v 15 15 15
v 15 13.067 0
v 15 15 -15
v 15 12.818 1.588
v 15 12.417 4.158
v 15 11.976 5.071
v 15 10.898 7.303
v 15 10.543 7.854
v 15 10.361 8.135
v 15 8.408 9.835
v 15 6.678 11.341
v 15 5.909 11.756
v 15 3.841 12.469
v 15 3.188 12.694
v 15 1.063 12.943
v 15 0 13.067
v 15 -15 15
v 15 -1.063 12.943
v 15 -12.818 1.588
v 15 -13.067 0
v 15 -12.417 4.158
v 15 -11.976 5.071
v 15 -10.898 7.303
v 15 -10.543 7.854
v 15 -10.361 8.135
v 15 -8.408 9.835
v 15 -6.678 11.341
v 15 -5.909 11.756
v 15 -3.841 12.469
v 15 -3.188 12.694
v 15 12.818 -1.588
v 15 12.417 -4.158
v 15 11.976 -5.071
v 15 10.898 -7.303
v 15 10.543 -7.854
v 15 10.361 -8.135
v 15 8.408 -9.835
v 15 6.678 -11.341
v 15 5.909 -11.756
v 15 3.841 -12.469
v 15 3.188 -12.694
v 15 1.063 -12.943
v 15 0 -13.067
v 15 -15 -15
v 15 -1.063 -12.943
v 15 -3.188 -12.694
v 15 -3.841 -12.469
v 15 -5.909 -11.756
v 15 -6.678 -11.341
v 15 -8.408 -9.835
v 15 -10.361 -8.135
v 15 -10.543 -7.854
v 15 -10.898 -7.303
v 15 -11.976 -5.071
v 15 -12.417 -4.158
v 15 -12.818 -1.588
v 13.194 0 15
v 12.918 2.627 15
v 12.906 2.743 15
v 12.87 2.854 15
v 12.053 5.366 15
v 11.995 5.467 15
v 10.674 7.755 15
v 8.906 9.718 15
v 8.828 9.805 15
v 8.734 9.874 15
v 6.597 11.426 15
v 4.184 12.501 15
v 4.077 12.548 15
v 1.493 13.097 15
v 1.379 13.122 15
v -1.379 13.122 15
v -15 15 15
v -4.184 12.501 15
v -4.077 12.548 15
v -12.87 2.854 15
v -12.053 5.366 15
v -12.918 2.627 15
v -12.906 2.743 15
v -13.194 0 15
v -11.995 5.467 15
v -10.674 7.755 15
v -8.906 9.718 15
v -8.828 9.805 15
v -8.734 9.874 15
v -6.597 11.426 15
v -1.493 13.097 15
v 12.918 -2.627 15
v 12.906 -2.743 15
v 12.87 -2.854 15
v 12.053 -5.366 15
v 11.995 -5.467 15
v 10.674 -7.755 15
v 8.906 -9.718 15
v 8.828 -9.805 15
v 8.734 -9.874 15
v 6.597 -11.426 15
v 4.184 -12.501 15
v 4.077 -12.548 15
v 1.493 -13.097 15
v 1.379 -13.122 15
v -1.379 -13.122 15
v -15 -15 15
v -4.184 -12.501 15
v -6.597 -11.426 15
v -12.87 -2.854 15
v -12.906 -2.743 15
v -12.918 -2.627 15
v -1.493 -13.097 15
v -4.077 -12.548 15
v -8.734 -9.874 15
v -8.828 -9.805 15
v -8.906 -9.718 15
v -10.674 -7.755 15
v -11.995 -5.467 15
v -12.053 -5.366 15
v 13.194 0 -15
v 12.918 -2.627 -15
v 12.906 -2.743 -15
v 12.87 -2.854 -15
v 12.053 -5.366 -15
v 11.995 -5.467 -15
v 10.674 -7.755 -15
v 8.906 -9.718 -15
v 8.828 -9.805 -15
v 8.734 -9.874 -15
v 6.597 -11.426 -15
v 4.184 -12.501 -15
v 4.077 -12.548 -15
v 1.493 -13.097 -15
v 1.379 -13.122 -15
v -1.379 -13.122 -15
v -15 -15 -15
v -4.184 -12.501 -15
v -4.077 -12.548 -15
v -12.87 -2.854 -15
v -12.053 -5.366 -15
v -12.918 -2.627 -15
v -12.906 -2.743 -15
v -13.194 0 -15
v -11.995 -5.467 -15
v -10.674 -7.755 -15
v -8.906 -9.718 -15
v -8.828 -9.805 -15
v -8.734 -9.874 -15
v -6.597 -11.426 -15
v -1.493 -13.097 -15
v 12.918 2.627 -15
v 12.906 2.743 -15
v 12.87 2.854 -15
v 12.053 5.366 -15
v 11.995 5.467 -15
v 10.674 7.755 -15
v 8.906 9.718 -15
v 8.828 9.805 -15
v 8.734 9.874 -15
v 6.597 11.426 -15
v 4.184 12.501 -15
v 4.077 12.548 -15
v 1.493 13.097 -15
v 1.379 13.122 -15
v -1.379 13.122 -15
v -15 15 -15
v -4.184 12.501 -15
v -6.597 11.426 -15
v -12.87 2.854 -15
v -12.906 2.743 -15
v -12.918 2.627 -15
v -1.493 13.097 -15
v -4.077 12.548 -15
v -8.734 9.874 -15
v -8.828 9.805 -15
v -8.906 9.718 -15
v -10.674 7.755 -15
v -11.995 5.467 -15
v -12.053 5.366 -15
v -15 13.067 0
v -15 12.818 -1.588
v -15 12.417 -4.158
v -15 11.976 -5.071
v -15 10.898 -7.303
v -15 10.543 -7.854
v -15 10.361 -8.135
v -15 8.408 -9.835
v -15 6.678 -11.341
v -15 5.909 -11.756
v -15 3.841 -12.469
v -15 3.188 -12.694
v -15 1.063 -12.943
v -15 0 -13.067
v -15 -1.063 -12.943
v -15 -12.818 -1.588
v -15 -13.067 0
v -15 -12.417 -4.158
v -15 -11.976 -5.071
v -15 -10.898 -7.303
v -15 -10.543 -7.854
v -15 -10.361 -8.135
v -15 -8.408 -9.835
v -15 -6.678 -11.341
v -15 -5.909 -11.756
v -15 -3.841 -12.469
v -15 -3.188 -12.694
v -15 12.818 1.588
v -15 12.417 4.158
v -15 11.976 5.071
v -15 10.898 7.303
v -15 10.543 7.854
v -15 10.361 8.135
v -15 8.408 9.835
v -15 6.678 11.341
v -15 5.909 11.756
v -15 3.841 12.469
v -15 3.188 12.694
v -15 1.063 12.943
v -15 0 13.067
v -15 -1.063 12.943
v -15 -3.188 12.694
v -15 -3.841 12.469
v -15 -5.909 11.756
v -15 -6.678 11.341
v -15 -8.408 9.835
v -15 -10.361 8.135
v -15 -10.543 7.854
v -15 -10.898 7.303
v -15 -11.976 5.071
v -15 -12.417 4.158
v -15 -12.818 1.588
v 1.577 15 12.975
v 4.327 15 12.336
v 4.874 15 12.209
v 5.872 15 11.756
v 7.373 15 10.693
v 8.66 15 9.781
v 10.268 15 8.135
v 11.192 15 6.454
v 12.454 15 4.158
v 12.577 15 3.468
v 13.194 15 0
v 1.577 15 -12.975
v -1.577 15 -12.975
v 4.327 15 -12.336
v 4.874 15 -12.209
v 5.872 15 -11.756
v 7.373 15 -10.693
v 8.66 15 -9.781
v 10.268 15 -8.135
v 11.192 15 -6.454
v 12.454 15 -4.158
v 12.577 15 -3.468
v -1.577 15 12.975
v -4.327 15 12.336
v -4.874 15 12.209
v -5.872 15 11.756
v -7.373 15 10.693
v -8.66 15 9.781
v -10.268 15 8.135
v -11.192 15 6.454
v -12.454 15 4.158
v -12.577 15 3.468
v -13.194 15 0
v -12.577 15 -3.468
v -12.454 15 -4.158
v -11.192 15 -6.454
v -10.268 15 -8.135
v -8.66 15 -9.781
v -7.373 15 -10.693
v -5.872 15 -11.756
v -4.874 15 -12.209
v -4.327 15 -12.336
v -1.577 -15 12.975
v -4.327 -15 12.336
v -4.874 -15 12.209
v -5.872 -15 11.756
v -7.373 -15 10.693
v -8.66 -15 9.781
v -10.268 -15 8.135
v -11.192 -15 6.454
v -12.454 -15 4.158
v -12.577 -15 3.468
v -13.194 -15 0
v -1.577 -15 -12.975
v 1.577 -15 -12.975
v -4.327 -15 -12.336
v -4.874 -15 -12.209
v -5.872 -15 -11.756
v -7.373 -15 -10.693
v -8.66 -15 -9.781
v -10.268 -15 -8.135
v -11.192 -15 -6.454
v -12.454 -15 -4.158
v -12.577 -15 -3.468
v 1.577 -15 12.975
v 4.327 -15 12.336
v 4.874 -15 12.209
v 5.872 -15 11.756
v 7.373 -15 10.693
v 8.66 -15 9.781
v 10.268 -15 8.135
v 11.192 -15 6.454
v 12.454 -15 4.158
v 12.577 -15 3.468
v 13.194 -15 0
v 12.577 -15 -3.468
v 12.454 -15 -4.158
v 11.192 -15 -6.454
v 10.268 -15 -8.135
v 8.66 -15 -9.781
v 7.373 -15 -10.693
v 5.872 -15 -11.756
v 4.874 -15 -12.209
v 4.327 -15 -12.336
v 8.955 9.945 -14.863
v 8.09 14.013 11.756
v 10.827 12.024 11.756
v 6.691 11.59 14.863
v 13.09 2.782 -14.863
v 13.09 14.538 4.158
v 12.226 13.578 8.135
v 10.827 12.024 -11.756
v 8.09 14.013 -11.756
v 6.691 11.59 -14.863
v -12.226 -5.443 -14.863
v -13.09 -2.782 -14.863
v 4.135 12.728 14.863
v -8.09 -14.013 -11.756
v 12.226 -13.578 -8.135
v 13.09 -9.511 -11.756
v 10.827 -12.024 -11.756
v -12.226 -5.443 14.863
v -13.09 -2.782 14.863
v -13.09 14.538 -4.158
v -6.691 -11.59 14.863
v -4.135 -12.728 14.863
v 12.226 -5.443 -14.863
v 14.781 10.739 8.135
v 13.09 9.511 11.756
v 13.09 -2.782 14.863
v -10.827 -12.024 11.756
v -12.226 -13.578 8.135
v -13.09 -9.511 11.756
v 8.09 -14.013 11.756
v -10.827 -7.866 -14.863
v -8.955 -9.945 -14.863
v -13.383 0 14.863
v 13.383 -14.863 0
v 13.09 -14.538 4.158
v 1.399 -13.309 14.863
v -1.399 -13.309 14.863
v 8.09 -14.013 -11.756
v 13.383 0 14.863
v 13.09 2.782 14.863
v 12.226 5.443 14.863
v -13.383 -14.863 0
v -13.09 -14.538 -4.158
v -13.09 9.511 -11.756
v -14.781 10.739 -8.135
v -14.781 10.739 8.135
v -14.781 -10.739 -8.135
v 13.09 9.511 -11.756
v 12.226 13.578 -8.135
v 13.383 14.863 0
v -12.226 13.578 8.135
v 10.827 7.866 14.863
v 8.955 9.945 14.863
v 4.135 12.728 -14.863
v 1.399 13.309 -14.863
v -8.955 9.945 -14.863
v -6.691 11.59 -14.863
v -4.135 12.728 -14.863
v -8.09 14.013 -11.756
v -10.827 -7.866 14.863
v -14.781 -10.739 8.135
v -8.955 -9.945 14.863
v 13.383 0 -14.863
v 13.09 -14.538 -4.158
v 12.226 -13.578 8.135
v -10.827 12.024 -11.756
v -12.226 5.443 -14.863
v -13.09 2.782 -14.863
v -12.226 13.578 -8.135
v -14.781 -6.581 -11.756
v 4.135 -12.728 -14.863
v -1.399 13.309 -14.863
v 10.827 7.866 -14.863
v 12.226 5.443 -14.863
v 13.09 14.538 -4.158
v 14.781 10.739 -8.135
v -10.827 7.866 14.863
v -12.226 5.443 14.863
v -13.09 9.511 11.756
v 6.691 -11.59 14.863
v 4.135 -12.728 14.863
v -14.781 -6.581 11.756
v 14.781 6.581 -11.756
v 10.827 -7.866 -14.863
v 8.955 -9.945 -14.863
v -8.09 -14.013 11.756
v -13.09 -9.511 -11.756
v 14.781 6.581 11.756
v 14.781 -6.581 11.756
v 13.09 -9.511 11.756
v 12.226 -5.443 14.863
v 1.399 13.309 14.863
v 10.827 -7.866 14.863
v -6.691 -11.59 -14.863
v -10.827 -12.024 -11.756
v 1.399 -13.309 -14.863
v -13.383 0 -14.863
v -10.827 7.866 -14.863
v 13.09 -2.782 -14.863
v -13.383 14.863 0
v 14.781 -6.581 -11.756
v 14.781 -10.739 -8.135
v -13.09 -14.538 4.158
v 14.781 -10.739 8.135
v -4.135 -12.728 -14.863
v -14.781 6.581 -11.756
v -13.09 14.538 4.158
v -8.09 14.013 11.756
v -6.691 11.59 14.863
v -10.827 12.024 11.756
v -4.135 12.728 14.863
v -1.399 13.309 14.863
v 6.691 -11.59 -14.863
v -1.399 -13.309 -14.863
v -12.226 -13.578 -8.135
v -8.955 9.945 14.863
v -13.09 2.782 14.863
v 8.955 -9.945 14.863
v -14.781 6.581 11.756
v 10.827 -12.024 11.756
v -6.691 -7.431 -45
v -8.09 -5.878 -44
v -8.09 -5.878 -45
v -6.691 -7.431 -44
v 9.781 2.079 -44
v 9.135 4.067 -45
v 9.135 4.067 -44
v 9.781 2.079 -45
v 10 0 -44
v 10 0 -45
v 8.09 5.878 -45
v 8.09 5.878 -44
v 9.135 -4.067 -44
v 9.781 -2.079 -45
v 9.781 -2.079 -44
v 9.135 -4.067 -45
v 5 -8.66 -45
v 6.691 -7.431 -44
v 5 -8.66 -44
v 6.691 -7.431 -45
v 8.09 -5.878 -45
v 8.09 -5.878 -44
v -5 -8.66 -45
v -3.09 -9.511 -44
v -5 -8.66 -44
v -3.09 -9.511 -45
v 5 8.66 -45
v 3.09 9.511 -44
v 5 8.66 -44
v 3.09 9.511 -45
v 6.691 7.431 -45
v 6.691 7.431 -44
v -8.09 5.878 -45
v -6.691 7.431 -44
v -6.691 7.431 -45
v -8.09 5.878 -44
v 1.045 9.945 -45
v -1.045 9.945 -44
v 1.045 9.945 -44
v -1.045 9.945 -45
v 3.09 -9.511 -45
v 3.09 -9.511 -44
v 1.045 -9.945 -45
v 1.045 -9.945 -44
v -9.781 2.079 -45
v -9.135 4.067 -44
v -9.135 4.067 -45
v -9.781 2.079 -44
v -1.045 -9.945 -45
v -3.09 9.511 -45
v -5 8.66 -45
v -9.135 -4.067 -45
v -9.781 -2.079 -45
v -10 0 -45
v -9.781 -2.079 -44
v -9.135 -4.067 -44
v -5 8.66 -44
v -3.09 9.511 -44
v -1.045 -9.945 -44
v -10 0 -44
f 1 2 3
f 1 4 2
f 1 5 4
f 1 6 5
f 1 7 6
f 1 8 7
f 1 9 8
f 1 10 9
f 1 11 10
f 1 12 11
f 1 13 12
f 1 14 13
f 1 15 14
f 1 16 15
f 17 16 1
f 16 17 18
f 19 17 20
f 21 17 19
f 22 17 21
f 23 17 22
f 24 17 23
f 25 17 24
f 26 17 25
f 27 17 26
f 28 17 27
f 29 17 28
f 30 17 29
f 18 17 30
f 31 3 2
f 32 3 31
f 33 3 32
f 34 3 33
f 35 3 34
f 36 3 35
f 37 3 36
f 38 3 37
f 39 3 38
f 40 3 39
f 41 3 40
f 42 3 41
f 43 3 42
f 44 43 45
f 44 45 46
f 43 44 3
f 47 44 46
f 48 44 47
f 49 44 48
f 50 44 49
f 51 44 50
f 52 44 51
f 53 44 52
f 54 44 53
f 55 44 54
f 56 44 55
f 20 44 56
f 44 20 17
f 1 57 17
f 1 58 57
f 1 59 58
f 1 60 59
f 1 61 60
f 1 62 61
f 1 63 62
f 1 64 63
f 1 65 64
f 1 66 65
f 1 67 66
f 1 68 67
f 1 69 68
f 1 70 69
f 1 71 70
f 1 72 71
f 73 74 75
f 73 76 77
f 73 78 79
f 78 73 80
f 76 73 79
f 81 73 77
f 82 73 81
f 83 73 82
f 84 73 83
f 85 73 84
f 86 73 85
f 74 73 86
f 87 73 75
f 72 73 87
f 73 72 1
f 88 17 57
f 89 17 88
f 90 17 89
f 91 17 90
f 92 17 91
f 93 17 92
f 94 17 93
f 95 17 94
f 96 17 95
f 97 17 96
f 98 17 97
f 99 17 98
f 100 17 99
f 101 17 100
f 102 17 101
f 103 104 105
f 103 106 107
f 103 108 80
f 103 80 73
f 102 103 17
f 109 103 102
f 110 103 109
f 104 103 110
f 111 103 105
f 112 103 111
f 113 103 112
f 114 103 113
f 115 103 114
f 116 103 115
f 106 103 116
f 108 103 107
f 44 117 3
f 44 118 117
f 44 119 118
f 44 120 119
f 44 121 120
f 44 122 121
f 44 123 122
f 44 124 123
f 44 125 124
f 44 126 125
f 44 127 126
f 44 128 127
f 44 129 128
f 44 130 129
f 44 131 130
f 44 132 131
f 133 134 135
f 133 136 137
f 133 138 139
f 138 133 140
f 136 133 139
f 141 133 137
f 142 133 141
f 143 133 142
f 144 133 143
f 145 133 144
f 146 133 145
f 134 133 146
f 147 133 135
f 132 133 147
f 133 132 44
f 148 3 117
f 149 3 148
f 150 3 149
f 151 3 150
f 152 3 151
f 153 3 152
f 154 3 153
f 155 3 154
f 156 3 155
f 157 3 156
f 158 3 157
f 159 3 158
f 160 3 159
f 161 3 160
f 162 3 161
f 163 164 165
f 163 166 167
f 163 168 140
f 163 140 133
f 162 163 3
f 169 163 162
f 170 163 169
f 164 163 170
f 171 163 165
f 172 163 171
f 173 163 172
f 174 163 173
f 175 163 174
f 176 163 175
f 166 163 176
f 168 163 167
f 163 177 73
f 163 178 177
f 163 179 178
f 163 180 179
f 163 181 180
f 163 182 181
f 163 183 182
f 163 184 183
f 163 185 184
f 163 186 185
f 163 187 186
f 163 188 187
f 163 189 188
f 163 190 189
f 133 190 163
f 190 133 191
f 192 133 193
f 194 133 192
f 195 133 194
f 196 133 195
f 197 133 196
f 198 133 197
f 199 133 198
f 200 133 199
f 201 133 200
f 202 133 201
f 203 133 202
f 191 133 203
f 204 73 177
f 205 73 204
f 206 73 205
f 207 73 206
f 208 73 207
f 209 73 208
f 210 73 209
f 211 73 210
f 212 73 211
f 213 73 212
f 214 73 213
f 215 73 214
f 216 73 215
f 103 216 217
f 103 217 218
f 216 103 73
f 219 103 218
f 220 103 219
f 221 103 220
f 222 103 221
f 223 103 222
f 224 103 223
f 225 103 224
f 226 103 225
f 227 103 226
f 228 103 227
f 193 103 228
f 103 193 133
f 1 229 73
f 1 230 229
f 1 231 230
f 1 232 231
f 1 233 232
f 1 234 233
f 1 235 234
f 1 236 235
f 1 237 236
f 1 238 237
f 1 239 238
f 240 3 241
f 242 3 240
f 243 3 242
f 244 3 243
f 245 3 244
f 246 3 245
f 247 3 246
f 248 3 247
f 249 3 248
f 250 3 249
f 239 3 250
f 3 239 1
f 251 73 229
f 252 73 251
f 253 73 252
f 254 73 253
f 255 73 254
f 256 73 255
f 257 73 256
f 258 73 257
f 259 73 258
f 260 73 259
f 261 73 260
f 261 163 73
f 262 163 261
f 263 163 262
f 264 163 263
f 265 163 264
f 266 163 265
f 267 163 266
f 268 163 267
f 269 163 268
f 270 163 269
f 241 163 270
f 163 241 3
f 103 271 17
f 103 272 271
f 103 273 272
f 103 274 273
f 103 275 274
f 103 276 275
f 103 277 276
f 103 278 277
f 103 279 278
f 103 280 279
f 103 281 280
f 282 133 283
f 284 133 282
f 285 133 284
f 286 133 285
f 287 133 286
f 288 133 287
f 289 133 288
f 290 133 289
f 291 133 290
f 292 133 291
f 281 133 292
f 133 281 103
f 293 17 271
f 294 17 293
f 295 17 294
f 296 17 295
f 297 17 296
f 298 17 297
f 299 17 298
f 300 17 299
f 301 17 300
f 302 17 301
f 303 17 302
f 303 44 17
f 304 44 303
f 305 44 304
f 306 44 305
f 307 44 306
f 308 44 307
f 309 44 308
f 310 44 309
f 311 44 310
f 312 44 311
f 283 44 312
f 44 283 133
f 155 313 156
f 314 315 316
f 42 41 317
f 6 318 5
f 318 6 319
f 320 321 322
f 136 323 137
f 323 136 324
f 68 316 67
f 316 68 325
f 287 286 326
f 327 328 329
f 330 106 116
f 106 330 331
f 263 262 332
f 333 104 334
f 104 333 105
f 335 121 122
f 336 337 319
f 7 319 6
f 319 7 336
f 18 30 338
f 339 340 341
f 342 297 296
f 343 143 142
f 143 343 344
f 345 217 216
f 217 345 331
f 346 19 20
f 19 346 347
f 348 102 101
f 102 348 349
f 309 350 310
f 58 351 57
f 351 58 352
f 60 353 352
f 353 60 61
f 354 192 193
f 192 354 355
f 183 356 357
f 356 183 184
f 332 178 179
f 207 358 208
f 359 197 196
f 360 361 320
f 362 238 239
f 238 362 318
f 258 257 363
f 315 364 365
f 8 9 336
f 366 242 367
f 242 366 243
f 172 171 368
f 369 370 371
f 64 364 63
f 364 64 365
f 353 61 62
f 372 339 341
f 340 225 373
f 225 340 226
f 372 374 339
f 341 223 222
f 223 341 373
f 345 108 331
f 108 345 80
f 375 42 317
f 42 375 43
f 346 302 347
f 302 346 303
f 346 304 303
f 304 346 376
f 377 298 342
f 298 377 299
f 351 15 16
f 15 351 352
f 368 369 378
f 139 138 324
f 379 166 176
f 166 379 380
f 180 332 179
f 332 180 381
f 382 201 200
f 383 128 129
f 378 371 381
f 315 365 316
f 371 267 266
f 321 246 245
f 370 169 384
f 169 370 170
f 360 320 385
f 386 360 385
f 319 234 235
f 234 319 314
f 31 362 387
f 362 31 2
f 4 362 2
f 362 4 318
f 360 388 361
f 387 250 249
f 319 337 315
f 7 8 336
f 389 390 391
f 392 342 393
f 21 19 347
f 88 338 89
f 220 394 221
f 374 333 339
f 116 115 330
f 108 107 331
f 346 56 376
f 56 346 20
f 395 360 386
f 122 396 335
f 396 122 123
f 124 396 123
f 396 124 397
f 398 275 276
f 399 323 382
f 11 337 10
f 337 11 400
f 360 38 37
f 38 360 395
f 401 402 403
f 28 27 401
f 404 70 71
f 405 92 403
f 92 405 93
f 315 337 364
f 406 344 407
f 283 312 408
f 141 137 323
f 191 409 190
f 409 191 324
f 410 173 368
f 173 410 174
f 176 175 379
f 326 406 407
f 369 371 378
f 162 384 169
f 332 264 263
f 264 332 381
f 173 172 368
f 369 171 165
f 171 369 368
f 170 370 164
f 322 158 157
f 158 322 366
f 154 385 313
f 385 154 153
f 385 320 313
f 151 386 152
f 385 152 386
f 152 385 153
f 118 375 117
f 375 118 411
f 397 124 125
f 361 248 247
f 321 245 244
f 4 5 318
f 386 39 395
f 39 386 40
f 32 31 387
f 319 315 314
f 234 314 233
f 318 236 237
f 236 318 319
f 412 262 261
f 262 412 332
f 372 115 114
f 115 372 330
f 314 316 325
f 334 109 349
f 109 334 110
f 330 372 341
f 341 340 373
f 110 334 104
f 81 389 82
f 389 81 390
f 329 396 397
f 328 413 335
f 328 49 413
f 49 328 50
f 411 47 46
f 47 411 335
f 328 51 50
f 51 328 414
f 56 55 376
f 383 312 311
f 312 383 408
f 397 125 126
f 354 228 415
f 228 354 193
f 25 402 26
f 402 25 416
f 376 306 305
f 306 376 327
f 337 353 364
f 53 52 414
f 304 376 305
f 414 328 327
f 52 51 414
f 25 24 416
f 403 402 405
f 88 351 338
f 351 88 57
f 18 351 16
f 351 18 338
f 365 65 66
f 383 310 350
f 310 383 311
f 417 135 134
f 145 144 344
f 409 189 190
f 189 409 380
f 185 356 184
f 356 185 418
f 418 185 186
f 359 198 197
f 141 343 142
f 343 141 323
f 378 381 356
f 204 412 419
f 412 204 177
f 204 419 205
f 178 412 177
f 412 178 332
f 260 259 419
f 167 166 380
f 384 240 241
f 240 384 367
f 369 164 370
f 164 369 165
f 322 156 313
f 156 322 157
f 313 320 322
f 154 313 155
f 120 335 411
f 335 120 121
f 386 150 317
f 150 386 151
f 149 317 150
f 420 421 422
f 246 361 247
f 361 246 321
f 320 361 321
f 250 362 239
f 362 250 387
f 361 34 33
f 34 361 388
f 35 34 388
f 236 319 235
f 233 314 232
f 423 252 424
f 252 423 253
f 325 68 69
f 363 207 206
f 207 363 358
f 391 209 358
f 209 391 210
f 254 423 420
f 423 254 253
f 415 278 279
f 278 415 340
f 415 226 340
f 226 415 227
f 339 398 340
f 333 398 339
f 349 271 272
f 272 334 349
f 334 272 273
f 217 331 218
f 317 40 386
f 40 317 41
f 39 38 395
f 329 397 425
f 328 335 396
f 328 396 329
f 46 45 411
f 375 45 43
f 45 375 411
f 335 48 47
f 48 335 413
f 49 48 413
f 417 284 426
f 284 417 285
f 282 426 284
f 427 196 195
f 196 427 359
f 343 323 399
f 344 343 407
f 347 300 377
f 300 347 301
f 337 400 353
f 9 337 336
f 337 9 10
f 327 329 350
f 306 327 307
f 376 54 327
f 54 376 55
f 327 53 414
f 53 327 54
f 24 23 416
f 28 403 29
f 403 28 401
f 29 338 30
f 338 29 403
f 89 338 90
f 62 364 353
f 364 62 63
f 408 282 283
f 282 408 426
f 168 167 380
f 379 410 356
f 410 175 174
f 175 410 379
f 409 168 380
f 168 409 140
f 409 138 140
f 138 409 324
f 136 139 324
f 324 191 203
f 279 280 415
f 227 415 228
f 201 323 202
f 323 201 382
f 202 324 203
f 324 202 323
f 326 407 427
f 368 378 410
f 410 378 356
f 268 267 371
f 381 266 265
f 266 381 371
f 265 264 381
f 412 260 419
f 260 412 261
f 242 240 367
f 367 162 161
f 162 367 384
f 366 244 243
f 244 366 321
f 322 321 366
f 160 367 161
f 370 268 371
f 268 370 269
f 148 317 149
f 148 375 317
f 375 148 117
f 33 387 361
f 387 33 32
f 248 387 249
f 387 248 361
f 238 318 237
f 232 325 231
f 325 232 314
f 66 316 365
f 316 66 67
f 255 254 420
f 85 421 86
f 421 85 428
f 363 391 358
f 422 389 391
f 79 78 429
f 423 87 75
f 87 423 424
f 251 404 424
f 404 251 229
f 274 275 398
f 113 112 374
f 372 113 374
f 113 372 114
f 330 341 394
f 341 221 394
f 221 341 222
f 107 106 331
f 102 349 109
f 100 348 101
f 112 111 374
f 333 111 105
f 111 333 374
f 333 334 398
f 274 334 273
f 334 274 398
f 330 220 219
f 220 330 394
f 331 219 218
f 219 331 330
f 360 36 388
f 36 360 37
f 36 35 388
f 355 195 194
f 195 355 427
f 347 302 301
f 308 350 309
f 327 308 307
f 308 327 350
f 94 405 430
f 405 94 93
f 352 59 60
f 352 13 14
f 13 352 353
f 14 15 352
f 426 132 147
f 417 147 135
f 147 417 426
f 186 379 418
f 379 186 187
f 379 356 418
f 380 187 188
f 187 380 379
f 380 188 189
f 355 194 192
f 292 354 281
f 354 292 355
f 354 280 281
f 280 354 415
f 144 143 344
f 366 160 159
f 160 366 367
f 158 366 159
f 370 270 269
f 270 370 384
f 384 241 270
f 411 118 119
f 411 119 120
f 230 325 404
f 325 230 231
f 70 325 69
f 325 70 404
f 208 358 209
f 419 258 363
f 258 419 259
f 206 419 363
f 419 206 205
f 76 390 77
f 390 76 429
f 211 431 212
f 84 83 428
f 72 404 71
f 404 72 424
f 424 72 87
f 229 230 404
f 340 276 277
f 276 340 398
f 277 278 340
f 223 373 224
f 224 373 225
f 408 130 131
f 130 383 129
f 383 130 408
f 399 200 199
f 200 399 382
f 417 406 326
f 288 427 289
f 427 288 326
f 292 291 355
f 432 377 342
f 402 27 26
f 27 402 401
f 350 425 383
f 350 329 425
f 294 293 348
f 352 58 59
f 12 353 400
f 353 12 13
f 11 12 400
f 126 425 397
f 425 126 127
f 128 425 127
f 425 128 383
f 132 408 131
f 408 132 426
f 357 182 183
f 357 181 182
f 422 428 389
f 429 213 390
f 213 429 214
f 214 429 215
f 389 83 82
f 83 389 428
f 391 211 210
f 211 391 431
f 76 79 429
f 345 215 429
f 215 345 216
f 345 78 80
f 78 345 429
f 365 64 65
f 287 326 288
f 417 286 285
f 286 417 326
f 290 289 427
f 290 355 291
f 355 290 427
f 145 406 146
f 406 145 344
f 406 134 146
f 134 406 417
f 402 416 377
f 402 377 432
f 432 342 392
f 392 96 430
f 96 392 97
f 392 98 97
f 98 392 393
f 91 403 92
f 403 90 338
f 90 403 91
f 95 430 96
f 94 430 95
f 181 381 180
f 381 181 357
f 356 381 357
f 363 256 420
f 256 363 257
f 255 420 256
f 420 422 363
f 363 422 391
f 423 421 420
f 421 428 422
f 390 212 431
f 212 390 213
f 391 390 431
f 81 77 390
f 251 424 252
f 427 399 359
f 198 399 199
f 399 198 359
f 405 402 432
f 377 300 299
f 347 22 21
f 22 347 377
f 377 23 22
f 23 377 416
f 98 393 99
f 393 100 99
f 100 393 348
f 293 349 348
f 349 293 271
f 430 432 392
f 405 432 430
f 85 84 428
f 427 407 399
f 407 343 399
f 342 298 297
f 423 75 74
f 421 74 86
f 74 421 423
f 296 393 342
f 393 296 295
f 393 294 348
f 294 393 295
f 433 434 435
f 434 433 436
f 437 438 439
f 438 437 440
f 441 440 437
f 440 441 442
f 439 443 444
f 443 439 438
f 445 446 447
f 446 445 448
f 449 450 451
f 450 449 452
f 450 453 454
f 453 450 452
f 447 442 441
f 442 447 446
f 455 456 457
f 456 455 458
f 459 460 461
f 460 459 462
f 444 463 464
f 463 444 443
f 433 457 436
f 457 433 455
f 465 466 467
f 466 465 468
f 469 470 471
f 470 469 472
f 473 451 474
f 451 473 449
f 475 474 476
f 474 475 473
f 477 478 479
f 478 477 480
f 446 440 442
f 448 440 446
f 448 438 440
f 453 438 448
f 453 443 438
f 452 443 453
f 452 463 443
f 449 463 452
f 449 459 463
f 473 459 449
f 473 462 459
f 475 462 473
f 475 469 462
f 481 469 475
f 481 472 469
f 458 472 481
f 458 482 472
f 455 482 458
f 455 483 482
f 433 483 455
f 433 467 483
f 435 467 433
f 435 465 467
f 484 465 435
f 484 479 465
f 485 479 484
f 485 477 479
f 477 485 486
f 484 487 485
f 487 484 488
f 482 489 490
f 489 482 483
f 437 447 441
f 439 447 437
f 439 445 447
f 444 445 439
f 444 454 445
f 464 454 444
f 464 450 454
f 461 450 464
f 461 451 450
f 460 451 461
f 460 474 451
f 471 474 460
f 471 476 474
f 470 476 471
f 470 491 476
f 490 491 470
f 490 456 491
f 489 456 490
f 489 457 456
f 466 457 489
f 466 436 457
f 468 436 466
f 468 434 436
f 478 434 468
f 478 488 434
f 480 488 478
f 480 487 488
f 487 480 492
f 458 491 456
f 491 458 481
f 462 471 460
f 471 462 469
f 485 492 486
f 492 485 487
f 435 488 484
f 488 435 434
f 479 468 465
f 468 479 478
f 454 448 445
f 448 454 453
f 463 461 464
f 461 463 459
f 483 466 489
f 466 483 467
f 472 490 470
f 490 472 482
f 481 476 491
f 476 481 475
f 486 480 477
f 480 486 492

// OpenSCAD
difference() {
	
	cube([30,30,30], center=true);
	sphere(20);
}
translate([0,0,-45]) cylinder(h=1, r=10);
